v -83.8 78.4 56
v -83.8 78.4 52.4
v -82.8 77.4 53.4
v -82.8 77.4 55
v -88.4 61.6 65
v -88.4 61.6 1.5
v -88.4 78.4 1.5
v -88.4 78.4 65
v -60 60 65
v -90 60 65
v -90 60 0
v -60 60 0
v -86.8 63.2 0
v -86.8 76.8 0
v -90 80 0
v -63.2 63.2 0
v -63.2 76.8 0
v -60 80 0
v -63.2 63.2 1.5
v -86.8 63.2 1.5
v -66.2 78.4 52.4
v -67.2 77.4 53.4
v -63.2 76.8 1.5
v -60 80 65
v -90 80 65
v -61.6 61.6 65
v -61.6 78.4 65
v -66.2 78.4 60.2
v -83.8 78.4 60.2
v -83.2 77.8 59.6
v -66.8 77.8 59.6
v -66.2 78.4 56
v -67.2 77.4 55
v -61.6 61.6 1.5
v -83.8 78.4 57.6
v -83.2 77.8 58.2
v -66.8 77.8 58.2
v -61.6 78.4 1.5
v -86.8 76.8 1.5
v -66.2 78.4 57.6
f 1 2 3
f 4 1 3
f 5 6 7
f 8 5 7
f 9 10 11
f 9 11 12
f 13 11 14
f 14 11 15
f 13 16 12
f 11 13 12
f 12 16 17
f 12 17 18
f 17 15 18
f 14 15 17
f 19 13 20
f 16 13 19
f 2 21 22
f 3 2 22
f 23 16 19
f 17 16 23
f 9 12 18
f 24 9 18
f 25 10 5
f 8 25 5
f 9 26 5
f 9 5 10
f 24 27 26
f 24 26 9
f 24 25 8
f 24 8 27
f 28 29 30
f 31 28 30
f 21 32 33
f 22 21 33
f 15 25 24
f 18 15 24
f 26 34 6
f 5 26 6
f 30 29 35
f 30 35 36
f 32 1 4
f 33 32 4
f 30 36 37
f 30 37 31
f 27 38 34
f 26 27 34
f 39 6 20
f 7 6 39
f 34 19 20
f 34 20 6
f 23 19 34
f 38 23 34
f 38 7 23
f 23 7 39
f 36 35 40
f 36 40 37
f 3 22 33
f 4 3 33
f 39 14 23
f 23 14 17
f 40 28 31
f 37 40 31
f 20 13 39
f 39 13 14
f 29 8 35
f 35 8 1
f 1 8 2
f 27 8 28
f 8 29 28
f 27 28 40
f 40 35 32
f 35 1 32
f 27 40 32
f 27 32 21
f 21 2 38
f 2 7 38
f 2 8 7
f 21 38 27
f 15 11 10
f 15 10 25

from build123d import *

# Parameters (mm, degrees)
F0_W         = 30
F0_H         = 20
F1_DEPTH     = 65
F0_W_2       = 23.6
F0_H_2       = 13.6
F0_W_3       = 16.8
F0_H_3       = 1
F2_DEPTH     = 1.5
F4_W         = 0.6
F4_H         = 3
F4_W_2       = 1
F4_H_2       = 4
F5_DEPTH     = 9
F6_T4_DEPTH  = 22.1146927807
F6_T9_DEPTH  = 22.1146927807
F6_T14_DEPTH = 7.1146927807
F6_T19_DEPTH = 7.1146927807
F7_T4_DEPTH  = 24.1720391711
F7_T9_DEPTH  = 24.1720391711
F7_T14_DEPTH = 10.1720391711
F7_T19_DEPTH = 10.1720391711


# Not quite as in the source:
# - a fillet or chamfer that OpenCascade refuses, or shapes differently, is made with other operations: its cross-section is extruded or revolved along the edge and cut away or added


with BuildPart() as f1:
    # F0 (on Top) → F1 (new body)
    with BuildSketch(Plane.XY):
        with Locations((-75, 70)):
            Rectangle(F0_W, F0_H)
        Polygon((-88.4, 61.6), (-88.4, 78.4), (-83.4, 78.4), (-66.6, 78.4), (-61.6, 78.4), (-61.6, 61.6), align=None, mode=Mode.SUBTRACT)
    extrude(amount=F1_DEPTH)

    # F0 (on Top) → F2 (join)
    with BuildSketch(Plane.XY):
        Polygon((-83.4, 78.4), (-88.4, 78.4), (-88.4, 61.6), (-61.6, 61.6), (-61.6, 78.4), (-66.6, 78.4), (-66.6, 77.4), (-83.4, 77.4), align=None)
        with Locations((-75, 70)):
            Rectangle(F0_W_2, F0_H_2, mode=Mode.SUBTRACT)
        with Locations((-75, 77.9)):
            Rectangle(F0_W_3, F0_H_3)
    extrude(amount=F2_DEPTH)

    # F4 (on mid) → F5 (join, symmetric)
    with BuildSketch(Plane.YZ.offset(-75)):
        with Locations((78.1, 58.9)):
            Rectangle(F4_W, F4_H)
        with Locations((77.9, 54.2)):
            Rectangle(F4_W_2, F4_H_2)
    extrude(amount=F5_DEPTH, both=True)

    # F6: chamfer of 0.8 on 4 edges, made by hand


with BuildPart() as f6_tool2:
    # F6_s3 → F6_t4 (new body)
    with BuildSketch(Plane.YZ.offset(-86.0573463904)):
        Polygon((78.6, 60.4), (77.8, 59.6), (77.8, 60.4), align=None)
    extrude(amount=F6_T4_DEPTH)

    split(bisect_by=Plane.XZ.offset(-78.4), keep=Keep.TOP)


with BuildPart() as f1_1:
    add(f1.part)

    # F6_t1: cut F6_tool2
    add(f6_tool2.part, mode=Mode.SUBTRACT)


with BuildPart() as f6_tool7:
    # F6_s8 → F6_t9 (new body)
    with BuildSketch(Plane.YZ.offset(-63.9426536096)):
        Polygon((78.6, 57.4), (77.8, 58.2), (77.8, 57.4), align=None)
    extrude(amount=-F6_T9_DEPTH)

    split(bisect_by=Plane.XZ.offset(-78.4), keep=Keep.TOP)


with BuildPart() as f1_2:
    add(f1_1.part)

    # F6_t6: cut F6_tool7
    add(f6_tool7.part, mode=Mode.SUBTRACT)


with BuildPart() as f6_tool12:
    # F6_s13 → F6_t14 (new body)
    with BuildSketch(Plane.XY.offset(62.4573463904)):
        Polygon((-84, 78.6), (-83.2, 77.8), (-84, 77.8), align=None)
    extrude(amount=-F6_T14_DEPTH)

    split(bisect_by=Plane.XZ.offset(-78.4), keep=Keep.TOP)


with BuildPart() as f1_3:
    add(f1_2.part)

    # F6_t11: cut F6_tool12
    add(f6_tool12.part, mode=Mode.SUBTRACT)


with BuildPart() as f6_tool17:
    # F6_s18 → F6_t19 (new body)
    with BuildSketch(Plane.XY.offset(62.4573463904)):
        Polygon((-66, 78.6), (-66.8, 77.8), (-66, 77.8), align=None)
    extrude(amount=-F6_T19_DEPTH)

    split(bisect_by=Plane.XZ.offset(-78.4), keep=Keep.TOP)


with BuildPart() as f1_4:
    add(f1_3.part)

    # F6_t16: cut F6_tool17
    add(f6_tool17.part, mode=Mode.SUBTRACT)

    # F7: chamfer of 1.2 on 4 edges, made by hand


with BuildPart() as f7_tool2:
    # F7_s3 → F7_t4 (new body)
    with BuildSketch(Plane.YZ.offset(-87.0860195856)):
        Polygon((78.6, 56.2), (77.4, 55), (77.4, 56.2), align=None)
    extrude(amount=F7_T4_DEPTH)

    split(bisect_by=Plane.XZ.offset(-78.4), keep=Keep.TOP)


with BuildPart() as f1_5:
    add(f1_4.part)

    # F7_t1: cut F7_tool2
    add(f7_tool2.part, mode=Mode.SUBTRACT)


with BuildPart() as f7_tool7:
    # F7_s8 → F7_t9 (new body)
    with BuildSketch(Plane.YZ.offset(-62.9139804144)):
        Polygon((78.6, 52.2), (77.4, 53.4), (77.4, 52.2), align=None)
    extrude(amount=-F7_T9_DEPTH)

    split(bisect_by=Plane.XZ.offset(-78.4), keep=Keep.TOP)


with BuildPart() as f1_6:
    add(f1_5.part)

    # F7_t6: cut F7_tool7
    add(f7_tool7.part, mode=Mode.SUBTRACT)


with BuildPart() as f7_tool12:
    # F7_s13 → F7_t14 (new body)
    with BuildSketch(Plane.XY.offset(59.2860195856)):
        Polygon((-84, 78.6), (-82.8, 77.4), (-84, 77.4), align=None)
    extrude(amount=-F7_T14_DEPTH)

    split(bisect_by=Plane.XZ.offset(-78.4), keep=Keep.TOP)


with BuildPart() as f1_7:
    add(f1_6.part)

    # F7_t11: cut F7_tool12
    add(f7_tool12.part, mode=Mode.SUBTRACT)


with BuildPart() as f7_tool17:
    # F7_s18 → F7_t19 (new body)
    with BuildSketch(Plane.XY.offset(59.2860195856)):
        Polygon((-66, 78.6), (-67.2, 77.4), (-66, 77.4), align=None)
    extrude(amount=-F7_T19_DEPTH)

    split(bisect_by=Plane.XZ.offset(-78.4), keep=Keep.TOP)


with BuildPart() as f1_8:
    add(f1_7.part)

    # F7_t16: cut F7_tool17
    add(f7_tool17.part, mode=Mode.SUBTRACT)


solid = f1_8.part
